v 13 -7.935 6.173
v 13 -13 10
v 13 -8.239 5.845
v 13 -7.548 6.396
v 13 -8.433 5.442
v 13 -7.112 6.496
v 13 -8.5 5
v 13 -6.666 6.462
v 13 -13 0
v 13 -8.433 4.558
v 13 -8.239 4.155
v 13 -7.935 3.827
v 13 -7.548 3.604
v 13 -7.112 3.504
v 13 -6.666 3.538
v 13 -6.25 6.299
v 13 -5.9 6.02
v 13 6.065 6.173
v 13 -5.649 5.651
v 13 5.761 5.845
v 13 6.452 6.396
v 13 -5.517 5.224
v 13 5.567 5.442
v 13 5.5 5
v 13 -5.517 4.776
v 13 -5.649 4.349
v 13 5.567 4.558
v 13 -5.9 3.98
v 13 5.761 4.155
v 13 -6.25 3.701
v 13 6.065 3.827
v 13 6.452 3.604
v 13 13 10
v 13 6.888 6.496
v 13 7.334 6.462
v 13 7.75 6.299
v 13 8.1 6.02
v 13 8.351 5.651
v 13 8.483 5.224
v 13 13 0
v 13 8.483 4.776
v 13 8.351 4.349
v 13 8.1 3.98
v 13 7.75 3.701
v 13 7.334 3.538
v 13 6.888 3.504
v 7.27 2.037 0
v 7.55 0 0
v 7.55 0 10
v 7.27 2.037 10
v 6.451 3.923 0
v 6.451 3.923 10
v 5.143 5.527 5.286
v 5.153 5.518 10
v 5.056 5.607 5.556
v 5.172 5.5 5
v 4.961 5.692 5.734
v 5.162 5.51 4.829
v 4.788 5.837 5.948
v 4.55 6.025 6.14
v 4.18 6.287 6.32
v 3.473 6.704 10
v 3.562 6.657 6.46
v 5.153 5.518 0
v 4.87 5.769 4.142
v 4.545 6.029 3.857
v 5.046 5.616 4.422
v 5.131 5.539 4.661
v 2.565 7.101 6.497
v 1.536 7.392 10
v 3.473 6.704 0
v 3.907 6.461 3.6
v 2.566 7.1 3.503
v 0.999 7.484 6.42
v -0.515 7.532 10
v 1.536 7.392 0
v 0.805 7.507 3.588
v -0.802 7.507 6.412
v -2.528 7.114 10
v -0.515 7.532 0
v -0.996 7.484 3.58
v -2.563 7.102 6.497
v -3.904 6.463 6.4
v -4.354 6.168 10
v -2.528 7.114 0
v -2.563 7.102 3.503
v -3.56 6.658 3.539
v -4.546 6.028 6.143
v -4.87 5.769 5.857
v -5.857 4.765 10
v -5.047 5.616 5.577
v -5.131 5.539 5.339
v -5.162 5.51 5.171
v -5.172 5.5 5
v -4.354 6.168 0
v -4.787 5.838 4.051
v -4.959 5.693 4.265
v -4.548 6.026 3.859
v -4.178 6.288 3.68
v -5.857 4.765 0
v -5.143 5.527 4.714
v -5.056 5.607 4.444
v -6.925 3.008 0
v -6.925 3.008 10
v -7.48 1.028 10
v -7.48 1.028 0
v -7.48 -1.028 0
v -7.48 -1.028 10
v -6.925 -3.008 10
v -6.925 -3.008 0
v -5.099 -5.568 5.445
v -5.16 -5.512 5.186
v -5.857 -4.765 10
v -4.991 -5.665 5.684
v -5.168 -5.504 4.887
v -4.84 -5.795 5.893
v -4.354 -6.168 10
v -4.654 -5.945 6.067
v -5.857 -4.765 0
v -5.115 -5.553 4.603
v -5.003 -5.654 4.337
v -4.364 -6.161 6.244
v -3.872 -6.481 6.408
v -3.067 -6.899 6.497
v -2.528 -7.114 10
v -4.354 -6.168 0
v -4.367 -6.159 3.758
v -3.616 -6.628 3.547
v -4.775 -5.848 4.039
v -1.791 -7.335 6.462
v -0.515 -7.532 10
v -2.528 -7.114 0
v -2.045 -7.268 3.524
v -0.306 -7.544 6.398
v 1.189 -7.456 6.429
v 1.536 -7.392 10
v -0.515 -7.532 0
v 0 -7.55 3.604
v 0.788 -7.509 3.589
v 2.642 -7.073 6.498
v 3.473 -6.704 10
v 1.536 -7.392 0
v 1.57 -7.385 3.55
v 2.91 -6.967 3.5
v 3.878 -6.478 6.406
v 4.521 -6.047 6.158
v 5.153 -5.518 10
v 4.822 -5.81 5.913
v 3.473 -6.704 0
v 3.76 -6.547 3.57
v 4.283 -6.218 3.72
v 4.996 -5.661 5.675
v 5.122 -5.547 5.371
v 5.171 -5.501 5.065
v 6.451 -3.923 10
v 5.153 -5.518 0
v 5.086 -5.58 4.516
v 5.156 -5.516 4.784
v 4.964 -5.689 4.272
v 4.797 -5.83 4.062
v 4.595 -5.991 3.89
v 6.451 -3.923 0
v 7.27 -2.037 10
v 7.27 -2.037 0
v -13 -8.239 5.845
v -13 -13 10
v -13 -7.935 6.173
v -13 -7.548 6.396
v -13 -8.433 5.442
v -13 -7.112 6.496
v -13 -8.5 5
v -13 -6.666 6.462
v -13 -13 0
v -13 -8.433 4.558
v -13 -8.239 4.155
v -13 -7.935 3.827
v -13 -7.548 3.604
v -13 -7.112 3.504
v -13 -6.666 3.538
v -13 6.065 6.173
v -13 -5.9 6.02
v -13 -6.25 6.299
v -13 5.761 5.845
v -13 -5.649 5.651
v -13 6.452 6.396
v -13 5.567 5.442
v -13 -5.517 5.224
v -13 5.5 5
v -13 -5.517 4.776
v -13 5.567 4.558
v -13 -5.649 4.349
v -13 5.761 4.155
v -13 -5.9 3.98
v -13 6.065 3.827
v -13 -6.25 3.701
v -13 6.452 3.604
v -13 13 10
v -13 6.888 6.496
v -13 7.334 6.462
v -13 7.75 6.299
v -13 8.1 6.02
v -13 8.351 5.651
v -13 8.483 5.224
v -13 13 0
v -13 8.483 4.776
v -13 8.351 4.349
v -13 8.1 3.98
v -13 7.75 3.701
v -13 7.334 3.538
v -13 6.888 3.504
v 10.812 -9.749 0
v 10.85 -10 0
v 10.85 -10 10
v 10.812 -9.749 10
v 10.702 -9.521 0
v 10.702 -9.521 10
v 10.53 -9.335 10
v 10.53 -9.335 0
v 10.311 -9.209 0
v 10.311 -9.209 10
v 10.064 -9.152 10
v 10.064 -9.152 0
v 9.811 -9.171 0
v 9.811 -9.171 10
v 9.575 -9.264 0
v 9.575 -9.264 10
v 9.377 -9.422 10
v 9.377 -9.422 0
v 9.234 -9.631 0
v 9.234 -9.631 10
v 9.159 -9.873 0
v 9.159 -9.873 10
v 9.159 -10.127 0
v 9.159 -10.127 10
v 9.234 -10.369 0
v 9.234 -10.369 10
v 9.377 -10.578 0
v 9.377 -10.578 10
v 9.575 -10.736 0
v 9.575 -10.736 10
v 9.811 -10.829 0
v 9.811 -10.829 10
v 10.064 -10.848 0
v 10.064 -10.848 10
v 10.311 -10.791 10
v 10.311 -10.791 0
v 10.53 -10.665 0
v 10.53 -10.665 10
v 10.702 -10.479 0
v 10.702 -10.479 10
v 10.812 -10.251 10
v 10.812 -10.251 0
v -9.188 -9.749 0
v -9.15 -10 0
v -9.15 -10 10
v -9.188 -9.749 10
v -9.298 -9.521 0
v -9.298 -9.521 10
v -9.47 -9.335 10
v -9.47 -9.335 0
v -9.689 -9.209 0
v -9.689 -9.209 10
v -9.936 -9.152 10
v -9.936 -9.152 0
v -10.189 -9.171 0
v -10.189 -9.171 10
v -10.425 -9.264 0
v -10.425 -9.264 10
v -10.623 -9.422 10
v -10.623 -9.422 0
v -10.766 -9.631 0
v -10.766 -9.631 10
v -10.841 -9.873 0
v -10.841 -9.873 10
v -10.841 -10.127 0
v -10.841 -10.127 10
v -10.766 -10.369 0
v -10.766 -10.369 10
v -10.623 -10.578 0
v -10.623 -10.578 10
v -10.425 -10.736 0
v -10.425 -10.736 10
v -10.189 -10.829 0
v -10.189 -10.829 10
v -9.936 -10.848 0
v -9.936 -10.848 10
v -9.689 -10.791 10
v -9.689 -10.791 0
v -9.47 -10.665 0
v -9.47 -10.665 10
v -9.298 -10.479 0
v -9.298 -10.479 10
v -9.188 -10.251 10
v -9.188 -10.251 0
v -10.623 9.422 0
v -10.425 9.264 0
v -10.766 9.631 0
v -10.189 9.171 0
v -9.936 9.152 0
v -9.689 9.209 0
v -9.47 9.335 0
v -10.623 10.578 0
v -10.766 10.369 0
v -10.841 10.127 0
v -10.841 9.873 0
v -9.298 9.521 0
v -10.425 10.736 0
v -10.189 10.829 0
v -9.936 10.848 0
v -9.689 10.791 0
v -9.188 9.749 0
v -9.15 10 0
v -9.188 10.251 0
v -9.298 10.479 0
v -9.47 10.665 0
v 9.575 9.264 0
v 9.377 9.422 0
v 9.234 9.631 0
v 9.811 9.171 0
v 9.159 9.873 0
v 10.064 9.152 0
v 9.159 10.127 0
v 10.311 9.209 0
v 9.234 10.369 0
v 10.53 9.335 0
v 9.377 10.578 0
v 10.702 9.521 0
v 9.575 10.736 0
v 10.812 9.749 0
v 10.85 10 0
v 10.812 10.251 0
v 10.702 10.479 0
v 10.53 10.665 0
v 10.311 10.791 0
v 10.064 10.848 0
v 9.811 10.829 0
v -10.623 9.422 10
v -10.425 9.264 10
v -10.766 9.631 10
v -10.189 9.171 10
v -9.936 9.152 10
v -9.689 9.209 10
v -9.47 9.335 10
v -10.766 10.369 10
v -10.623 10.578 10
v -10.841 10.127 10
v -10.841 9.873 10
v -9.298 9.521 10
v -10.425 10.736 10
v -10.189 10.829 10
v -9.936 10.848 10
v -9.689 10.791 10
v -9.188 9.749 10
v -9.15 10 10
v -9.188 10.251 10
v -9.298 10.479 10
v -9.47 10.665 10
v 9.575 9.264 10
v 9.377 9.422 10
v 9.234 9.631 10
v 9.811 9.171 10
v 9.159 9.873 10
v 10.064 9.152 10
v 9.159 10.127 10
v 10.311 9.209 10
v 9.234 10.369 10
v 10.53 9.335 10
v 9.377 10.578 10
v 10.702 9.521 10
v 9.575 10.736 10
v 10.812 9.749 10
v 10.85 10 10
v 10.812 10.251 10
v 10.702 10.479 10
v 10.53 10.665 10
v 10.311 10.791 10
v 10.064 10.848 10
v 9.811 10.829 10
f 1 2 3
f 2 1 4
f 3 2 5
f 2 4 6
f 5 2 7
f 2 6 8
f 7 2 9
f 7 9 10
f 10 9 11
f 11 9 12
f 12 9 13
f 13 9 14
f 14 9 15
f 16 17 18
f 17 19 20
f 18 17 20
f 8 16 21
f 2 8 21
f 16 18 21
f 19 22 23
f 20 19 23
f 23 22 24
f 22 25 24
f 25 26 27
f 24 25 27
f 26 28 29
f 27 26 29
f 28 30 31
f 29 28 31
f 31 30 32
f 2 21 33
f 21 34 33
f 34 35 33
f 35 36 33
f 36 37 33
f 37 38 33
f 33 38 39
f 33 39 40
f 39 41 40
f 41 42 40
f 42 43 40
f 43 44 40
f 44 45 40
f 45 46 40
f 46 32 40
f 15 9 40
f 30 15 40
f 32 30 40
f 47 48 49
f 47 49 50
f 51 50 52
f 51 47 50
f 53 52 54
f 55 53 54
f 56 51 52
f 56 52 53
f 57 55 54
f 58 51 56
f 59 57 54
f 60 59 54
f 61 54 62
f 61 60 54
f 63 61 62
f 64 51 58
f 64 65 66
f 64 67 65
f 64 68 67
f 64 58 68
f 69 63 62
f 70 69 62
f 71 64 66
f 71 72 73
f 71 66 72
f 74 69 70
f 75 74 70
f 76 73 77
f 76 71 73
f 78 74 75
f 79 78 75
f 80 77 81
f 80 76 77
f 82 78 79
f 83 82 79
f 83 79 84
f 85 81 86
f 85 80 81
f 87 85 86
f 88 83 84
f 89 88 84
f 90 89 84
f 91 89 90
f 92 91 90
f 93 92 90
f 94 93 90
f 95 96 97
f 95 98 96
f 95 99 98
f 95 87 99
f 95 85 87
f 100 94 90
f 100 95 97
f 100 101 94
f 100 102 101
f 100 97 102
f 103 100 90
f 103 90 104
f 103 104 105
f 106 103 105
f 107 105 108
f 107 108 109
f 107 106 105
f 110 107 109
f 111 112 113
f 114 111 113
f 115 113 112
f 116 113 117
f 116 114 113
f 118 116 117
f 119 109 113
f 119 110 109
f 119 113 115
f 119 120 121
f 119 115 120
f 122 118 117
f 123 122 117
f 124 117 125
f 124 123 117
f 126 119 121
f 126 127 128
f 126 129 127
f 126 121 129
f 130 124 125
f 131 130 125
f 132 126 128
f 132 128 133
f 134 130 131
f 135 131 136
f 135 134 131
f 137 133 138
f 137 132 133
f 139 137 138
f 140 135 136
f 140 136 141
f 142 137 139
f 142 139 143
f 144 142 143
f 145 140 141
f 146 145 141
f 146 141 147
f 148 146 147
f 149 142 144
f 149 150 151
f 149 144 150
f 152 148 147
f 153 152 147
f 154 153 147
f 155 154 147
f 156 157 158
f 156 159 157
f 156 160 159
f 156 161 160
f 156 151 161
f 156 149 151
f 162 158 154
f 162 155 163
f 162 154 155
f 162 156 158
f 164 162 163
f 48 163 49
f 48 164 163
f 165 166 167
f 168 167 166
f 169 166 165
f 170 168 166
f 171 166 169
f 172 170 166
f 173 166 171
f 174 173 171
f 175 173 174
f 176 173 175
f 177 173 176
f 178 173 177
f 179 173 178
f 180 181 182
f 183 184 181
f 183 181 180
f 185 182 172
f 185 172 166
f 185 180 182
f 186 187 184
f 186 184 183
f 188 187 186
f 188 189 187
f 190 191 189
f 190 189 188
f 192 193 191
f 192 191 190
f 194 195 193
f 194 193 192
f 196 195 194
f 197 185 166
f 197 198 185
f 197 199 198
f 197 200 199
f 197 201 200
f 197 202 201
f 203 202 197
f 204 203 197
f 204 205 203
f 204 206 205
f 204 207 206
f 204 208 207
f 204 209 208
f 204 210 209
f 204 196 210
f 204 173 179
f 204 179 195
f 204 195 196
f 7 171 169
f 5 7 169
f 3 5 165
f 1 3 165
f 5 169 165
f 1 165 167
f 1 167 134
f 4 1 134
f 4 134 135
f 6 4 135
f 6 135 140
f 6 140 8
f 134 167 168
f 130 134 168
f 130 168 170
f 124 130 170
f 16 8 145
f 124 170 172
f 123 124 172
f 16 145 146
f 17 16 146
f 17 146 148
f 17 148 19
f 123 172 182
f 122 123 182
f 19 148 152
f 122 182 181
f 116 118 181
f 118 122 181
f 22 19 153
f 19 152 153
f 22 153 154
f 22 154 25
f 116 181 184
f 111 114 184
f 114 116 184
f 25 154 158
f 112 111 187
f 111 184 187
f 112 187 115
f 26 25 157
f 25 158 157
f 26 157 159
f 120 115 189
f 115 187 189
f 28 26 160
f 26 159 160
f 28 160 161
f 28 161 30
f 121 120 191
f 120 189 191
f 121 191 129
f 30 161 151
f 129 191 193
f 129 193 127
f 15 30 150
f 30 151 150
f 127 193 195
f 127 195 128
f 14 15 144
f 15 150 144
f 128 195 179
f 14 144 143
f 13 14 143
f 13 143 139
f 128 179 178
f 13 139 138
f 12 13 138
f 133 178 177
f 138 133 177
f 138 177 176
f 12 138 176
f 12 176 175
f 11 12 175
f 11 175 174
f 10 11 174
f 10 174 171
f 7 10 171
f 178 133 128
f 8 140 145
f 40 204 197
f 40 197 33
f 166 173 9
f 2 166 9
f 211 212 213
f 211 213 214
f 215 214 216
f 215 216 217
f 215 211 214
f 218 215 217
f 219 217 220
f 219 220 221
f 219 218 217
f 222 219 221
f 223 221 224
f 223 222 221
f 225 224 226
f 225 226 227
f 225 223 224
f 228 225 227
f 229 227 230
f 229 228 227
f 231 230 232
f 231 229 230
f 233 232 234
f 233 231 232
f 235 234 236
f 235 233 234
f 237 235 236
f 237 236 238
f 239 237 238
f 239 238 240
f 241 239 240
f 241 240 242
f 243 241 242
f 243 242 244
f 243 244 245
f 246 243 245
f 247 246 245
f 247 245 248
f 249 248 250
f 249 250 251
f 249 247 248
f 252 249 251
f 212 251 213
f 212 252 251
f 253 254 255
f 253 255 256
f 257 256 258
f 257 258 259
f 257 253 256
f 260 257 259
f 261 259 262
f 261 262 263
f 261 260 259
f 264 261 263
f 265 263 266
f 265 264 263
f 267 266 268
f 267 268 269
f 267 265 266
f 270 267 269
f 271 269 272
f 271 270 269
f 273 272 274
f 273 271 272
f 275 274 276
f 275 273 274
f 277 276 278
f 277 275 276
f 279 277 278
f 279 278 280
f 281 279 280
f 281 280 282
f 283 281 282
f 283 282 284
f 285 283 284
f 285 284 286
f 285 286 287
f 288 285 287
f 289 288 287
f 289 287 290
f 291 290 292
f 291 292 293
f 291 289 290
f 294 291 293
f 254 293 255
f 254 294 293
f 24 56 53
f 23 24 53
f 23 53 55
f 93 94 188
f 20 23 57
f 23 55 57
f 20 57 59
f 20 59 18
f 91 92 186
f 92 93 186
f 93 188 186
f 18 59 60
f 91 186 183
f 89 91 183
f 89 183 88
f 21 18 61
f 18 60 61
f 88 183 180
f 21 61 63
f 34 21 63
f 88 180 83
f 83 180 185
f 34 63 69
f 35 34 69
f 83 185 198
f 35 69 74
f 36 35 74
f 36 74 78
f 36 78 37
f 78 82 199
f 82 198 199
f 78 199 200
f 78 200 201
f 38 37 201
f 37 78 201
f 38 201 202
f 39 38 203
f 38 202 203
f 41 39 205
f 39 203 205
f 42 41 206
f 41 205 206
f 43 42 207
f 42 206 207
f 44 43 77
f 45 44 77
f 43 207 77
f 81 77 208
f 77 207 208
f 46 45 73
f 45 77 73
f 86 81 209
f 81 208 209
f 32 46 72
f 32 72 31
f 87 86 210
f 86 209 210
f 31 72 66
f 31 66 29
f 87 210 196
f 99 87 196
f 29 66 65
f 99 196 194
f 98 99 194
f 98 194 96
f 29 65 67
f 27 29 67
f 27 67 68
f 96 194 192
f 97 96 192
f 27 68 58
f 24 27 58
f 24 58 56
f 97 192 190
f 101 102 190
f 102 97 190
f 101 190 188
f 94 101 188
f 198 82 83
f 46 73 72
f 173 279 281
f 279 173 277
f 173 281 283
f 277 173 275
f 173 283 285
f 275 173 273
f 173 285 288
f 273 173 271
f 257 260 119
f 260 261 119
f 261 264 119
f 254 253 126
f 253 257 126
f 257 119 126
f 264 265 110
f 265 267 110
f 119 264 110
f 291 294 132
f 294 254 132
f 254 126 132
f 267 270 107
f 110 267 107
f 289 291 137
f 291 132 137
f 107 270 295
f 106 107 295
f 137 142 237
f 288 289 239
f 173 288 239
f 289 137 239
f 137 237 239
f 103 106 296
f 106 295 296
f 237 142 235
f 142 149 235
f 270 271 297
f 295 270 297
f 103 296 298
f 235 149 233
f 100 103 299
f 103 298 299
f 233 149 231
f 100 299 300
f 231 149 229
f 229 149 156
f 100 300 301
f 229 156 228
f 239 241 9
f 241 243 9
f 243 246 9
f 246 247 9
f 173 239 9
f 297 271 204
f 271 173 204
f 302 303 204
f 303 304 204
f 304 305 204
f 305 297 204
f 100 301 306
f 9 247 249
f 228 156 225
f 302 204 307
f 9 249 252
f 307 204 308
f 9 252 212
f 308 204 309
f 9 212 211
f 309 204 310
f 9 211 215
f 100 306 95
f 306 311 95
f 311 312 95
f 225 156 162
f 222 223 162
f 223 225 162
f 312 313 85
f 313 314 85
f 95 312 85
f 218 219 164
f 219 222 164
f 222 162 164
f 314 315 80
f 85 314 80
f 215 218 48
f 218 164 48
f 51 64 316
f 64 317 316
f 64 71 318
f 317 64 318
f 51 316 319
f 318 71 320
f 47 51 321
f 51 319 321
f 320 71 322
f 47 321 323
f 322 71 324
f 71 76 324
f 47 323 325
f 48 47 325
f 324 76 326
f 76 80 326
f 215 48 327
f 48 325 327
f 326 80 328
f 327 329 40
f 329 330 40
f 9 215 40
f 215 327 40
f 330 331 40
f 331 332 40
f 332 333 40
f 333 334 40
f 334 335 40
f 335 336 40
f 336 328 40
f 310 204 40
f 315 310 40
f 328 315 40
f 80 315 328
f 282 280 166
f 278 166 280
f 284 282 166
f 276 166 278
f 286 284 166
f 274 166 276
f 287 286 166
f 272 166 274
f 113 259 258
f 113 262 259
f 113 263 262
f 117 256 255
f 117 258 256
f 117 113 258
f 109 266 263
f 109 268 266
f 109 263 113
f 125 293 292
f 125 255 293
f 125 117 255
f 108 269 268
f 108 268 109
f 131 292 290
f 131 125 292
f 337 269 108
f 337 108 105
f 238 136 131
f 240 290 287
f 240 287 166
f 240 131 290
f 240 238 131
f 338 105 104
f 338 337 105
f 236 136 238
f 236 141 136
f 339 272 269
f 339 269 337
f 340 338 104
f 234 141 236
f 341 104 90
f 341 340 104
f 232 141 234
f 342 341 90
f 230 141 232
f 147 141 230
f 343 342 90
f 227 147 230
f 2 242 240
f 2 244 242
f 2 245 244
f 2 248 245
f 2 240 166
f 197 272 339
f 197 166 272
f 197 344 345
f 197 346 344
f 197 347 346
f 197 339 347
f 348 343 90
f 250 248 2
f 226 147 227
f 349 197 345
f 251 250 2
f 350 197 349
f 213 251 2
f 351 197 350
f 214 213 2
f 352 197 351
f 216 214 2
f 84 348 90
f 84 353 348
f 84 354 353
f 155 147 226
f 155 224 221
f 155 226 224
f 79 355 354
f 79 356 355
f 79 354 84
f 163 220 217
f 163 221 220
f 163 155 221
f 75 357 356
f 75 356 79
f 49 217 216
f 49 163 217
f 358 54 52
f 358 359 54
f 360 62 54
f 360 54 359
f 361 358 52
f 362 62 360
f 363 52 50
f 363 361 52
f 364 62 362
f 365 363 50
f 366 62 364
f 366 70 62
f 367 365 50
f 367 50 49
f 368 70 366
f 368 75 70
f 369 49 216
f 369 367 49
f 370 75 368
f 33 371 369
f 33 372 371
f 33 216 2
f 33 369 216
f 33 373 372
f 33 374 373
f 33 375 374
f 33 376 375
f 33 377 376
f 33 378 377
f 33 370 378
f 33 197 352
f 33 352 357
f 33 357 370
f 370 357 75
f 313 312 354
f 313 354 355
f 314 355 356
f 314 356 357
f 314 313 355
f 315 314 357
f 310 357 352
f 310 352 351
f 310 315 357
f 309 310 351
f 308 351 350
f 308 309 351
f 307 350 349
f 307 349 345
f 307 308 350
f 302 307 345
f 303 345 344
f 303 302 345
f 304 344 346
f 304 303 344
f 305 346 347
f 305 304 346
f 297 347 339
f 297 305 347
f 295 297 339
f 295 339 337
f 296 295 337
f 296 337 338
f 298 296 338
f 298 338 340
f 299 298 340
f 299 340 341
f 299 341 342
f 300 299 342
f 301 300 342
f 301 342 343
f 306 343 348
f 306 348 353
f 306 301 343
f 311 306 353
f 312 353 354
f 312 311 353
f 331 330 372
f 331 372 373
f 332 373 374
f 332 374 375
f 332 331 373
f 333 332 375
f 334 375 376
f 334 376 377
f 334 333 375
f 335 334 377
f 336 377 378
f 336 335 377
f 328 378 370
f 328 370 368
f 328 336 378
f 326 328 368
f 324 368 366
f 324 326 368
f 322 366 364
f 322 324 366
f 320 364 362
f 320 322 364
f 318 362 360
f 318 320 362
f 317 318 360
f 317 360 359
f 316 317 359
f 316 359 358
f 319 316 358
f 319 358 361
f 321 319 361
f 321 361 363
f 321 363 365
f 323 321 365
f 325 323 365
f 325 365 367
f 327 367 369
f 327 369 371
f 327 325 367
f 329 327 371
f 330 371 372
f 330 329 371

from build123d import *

# Parameters (mm, degrees)
F0_W     = 26
F0_H     = 26
F0_R     = 0.85
F0_R_2   = 7.55
F1_DEPTH = 10
F2_R     = 1.5
F3_DEPTH = 26.001


with BuildPart() as f1:
    # F0 (on Top) → F1 (new body)
    with BuildSketch(Plane.XY):
        Rectangle(F0_W, F0_H)
        with Locations((-10, -10)):
            Circle(F0_R, mode=Mode.SUBTRACT)
        with Locations((10, -10)):
            Circle(F0_R, mode=Mode.SUBTRACT)
        with Locations((-10, 10)):
            Circle(F0_R, mode=Mode.SUBTRACT)
        Circle(F0_R_2, mode=Mode.SUBTRACT)
        with Locations((10, 10)):
            Circle(F0_R, mode=Mode.SUBTRACT)
    extrude(amount=F1_DEPTH)

    # F2 (on face) → F3 (cut, through all)
    with BuildSketch(Plane(origin=(-13, 0, 0), x_dir=(0, -1, 0), z_dir=(-1, 0, 0))):
        with Locations((-7, 5)):
            Circle(F2_R)
        with Locations((7, 5)):
            Circle(F2_R)
    extrude(amount=-F3_DEPTH, mode=Mode.SUBTRACT)


solid = f1.part
